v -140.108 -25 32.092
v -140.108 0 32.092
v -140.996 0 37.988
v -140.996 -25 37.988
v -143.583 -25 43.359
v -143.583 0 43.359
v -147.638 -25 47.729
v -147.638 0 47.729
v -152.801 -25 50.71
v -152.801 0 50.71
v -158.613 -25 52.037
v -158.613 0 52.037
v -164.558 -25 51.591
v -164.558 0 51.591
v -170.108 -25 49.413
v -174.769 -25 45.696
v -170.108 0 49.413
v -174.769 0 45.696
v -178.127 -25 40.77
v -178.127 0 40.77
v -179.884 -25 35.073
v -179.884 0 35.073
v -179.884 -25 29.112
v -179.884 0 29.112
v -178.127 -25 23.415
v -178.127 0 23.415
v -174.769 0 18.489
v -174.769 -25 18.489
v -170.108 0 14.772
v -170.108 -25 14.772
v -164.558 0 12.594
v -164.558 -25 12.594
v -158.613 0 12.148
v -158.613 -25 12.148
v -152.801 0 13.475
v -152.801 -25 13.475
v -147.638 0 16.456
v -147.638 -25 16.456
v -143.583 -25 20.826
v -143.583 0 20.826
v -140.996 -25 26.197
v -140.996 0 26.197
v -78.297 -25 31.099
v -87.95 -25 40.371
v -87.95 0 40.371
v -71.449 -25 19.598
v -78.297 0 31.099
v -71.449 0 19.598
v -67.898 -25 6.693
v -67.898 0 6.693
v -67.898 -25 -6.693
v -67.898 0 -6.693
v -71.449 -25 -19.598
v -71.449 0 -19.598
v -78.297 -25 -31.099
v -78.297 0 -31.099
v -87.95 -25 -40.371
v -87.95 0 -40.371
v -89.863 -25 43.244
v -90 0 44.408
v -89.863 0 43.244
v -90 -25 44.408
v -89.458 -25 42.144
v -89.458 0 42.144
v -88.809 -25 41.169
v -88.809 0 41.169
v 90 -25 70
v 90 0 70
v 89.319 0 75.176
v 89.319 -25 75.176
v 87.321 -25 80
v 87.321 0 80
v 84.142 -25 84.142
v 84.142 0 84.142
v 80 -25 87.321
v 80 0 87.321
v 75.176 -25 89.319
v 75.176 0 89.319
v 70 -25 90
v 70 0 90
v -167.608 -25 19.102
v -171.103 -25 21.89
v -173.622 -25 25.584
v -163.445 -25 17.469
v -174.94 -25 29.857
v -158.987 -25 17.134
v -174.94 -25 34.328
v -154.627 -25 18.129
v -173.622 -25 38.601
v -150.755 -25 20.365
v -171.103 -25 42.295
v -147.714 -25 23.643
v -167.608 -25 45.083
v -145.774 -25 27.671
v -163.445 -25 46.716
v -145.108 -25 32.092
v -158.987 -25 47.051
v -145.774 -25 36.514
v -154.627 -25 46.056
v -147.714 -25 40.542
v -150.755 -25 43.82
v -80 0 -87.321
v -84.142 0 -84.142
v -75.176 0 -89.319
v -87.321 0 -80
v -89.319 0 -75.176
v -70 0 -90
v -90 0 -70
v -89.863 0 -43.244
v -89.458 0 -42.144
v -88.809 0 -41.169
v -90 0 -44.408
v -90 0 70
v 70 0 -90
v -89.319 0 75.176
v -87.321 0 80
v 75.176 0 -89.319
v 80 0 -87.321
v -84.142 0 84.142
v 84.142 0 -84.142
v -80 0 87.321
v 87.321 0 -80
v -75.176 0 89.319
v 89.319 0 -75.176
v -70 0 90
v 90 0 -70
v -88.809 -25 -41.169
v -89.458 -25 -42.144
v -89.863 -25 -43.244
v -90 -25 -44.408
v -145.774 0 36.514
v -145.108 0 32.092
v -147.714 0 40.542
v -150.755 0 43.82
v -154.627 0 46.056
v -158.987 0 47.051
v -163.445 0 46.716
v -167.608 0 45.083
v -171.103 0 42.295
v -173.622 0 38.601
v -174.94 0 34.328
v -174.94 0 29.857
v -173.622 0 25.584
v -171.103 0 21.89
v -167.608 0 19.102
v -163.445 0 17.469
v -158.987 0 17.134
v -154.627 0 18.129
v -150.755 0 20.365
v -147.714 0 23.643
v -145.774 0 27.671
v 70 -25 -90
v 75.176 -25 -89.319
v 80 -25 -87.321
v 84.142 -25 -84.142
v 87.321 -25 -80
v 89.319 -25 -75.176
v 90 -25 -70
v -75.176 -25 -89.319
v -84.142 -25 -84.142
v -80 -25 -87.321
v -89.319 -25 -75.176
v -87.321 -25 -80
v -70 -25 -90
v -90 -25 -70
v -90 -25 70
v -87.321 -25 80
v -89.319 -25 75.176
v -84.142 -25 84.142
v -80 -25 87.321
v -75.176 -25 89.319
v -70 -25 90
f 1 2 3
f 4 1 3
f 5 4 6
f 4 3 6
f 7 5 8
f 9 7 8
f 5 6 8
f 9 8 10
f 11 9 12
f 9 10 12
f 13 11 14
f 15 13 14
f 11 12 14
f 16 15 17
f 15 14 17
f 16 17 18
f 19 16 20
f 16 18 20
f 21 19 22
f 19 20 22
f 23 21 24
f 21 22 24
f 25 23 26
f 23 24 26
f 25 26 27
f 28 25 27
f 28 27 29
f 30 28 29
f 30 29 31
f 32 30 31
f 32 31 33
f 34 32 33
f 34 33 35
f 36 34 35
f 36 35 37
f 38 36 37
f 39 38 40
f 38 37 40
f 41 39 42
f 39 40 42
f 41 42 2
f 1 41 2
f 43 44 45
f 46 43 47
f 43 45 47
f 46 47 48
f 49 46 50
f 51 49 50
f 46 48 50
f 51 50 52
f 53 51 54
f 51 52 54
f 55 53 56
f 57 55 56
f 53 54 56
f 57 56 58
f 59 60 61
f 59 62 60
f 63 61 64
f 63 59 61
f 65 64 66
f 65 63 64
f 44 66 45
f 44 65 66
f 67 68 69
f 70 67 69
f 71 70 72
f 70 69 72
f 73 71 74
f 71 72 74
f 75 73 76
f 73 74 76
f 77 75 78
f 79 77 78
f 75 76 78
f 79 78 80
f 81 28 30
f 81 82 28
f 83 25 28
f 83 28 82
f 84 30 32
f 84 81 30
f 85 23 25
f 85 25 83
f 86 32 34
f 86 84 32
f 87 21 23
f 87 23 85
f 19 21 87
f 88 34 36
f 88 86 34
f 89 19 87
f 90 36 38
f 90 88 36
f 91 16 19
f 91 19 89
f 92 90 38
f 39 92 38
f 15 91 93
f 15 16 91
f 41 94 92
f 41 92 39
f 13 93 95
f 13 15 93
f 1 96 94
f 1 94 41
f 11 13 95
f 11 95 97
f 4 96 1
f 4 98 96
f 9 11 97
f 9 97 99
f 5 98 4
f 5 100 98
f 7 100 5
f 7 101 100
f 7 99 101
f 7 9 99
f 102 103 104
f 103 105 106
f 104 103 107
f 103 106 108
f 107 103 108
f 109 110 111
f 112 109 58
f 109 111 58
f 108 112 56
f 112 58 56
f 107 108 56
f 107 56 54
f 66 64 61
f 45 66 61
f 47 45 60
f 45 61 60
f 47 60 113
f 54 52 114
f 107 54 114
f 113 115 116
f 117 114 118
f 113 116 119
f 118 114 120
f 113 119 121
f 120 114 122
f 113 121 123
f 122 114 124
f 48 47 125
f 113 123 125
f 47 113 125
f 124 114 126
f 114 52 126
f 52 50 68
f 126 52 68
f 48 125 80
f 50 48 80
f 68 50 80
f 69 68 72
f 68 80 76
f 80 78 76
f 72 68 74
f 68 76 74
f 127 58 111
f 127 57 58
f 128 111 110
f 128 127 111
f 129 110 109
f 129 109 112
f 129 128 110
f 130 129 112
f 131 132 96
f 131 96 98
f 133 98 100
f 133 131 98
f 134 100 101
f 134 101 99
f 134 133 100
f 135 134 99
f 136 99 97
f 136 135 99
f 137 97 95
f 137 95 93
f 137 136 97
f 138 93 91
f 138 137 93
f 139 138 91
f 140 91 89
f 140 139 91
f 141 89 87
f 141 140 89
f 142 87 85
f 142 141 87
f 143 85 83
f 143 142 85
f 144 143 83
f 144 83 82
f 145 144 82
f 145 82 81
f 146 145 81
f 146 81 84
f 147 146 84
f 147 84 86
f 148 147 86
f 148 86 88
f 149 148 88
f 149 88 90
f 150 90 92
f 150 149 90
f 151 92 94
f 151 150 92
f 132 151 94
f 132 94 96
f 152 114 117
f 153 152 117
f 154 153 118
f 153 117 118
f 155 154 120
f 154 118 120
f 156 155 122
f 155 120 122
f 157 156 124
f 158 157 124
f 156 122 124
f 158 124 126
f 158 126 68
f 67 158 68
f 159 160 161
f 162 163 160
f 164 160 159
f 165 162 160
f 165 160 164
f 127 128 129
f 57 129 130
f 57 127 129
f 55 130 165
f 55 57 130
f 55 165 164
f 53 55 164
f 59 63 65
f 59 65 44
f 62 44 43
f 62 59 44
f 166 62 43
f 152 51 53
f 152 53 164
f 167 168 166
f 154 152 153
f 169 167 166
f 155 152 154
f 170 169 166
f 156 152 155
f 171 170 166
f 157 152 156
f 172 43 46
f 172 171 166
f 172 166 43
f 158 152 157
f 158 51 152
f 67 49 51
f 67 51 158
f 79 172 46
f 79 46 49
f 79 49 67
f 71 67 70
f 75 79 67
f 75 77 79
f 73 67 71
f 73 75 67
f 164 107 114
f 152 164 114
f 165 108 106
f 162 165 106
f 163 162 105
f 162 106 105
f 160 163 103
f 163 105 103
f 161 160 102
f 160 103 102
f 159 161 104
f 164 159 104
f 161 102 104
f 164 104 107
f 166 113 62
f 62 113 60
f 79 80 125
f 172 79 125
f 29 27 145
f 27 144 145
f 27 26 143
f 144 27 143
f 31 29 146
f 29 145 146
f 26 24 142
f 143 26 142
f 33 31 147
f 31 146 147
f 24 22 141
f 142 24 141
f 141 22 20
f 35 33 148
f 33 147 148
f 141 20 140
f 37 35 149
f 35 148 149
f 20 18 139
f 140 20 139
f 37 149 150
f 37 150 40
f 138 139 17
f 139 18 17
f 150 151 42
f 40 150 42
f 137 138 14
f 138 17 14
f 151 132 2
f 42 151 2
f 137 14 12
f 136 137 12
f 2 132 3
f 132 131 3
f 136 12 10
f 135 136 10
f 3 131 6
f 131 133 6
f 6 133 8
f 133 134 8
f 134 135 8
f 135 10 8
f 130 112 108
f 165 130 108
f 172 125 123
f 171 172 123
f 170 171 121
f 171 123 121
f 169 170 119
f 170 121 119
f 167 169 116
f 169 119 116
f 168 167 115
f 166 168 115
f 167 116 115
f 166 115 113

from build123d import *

# Parameters (mm, degrees)
F1_DEPTH = 25
F2_R     = 20
F2_R_2   = 15
F3_DEPTH = 25
F4_R     = 5


with BuildPart() as f1:
    # F0 (on Front) → F1 (new body)
    with BuildSketch(Plane.XZ):
        with BuildLine():
            Line((70, 90), (-70, 90))
            ThreePointArc((-70, 90), (-84.1421356237, 84.1421356237), (-90, 70))
            Line((-90, 70), (-90, 41.7921018494))
            ThreePointArc((-90, 41.7921018494), (-67.4485012889, 0), (-90, -41.7921018494))
            Line((-90, -41.7921018494), (-90, -70))
            ThreePointArc((-90, -70), (-84.1421356237, -84.1421356237), (-70, -90))
            Line((-70, -90), (70, -90))
            ThreePointArc((70, -90), (84.1421356237, -84.1421356237), (90, -70))
            Line((90, -70), (90, 70))
            ThreePointArc((90, 70), (84.1421356237, 84.1421356237), (70, 90))
        make_face()
    extrude(amount=F1_DEPTH)

    # F4
    f4_edges = [f1.edges().sort_by_distance(p)[0] for p in [
        (-90, -12.5, -41.792102),
        (-90, -12.5, 41.792102),
    ]]
    fillet(f4_edges, radius=F4_R)


with BuildPart() as f3:
    # F2 (on Front) → F3 (new body)
    with BuildSketch(Plane.XZ):
        with Locations((-160.1076126099, 32.092448324)):
            Circle(F2_R)
        with Locations((-160.1076126099, 32.092448324)):
            Circle(F2_R_2, mode=Mode.SUBTRACT)
    extrude(amount=F3_DEPTH)


solid = Compound([f1.part, f3.part])
